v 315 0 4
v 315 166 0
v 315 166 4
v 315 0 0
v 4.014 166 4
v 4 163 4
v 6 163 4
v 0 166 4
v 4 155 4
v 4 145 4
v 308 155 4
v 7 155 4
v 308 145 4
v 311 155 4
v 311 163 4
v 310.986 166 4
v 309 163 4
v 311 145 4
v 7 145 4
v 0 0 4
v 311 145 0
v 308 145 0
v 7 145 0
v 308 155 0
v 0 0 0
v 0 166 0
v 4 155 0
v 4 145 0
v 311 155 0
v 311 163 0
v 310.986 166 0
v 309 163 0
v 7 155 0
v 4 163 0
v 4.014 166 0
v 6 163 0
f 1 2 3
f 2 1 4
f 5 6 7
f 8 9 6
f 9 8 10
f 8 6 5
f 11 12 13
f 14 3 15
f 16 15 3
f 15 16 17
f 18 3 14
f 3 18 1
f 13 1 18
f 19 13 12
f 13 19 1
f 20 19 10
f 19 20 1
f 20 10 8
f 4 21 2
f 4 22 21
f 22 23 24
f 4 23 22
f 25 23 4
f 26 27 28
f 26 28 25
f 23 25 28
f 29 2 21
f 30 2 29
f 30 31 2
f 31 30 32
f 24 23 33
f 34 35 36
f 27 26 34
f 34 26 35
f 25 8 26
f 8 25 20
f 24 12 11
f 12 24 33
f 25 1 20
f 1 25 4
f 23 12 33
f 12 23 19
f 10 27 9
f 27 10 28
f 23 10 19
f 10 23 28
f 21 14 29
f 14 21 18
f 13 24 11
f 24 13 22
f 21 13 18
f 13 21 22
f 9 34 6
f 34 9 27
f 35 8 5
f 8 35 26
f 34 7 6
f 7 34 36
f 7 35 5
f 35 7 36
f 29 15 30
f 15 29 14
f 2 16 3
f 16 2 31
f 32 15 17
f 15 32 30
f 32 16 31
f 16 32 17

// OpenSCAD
echo(version=version());

/* [Customizer] */
// Increase the visual detail
$fn = 100;


/* Sign */
difference() {
    color("green")
    cube([315,155,4]);

    translate([4,145,-1])
    color("yellow")
    cube([3,11,6]);

    translate([308,145,-1])
    color("yellow")
    cube([3,11,6]);
}    
    
/* Clips */


module border() {
    translate([0,155,0])
    color("red")
    cube([4,11,4]);
    
    difference() {
        translate([4,163,0])
        color("blue")
        cube([2,3,4]);
        
        translate([6,163,-1])
        color("pink")
        rotate([0,0,33.5])
        cube([2,4,6]);
    }
}



border();

translate([315,0,4])
rotate([0,180,0])
border();
